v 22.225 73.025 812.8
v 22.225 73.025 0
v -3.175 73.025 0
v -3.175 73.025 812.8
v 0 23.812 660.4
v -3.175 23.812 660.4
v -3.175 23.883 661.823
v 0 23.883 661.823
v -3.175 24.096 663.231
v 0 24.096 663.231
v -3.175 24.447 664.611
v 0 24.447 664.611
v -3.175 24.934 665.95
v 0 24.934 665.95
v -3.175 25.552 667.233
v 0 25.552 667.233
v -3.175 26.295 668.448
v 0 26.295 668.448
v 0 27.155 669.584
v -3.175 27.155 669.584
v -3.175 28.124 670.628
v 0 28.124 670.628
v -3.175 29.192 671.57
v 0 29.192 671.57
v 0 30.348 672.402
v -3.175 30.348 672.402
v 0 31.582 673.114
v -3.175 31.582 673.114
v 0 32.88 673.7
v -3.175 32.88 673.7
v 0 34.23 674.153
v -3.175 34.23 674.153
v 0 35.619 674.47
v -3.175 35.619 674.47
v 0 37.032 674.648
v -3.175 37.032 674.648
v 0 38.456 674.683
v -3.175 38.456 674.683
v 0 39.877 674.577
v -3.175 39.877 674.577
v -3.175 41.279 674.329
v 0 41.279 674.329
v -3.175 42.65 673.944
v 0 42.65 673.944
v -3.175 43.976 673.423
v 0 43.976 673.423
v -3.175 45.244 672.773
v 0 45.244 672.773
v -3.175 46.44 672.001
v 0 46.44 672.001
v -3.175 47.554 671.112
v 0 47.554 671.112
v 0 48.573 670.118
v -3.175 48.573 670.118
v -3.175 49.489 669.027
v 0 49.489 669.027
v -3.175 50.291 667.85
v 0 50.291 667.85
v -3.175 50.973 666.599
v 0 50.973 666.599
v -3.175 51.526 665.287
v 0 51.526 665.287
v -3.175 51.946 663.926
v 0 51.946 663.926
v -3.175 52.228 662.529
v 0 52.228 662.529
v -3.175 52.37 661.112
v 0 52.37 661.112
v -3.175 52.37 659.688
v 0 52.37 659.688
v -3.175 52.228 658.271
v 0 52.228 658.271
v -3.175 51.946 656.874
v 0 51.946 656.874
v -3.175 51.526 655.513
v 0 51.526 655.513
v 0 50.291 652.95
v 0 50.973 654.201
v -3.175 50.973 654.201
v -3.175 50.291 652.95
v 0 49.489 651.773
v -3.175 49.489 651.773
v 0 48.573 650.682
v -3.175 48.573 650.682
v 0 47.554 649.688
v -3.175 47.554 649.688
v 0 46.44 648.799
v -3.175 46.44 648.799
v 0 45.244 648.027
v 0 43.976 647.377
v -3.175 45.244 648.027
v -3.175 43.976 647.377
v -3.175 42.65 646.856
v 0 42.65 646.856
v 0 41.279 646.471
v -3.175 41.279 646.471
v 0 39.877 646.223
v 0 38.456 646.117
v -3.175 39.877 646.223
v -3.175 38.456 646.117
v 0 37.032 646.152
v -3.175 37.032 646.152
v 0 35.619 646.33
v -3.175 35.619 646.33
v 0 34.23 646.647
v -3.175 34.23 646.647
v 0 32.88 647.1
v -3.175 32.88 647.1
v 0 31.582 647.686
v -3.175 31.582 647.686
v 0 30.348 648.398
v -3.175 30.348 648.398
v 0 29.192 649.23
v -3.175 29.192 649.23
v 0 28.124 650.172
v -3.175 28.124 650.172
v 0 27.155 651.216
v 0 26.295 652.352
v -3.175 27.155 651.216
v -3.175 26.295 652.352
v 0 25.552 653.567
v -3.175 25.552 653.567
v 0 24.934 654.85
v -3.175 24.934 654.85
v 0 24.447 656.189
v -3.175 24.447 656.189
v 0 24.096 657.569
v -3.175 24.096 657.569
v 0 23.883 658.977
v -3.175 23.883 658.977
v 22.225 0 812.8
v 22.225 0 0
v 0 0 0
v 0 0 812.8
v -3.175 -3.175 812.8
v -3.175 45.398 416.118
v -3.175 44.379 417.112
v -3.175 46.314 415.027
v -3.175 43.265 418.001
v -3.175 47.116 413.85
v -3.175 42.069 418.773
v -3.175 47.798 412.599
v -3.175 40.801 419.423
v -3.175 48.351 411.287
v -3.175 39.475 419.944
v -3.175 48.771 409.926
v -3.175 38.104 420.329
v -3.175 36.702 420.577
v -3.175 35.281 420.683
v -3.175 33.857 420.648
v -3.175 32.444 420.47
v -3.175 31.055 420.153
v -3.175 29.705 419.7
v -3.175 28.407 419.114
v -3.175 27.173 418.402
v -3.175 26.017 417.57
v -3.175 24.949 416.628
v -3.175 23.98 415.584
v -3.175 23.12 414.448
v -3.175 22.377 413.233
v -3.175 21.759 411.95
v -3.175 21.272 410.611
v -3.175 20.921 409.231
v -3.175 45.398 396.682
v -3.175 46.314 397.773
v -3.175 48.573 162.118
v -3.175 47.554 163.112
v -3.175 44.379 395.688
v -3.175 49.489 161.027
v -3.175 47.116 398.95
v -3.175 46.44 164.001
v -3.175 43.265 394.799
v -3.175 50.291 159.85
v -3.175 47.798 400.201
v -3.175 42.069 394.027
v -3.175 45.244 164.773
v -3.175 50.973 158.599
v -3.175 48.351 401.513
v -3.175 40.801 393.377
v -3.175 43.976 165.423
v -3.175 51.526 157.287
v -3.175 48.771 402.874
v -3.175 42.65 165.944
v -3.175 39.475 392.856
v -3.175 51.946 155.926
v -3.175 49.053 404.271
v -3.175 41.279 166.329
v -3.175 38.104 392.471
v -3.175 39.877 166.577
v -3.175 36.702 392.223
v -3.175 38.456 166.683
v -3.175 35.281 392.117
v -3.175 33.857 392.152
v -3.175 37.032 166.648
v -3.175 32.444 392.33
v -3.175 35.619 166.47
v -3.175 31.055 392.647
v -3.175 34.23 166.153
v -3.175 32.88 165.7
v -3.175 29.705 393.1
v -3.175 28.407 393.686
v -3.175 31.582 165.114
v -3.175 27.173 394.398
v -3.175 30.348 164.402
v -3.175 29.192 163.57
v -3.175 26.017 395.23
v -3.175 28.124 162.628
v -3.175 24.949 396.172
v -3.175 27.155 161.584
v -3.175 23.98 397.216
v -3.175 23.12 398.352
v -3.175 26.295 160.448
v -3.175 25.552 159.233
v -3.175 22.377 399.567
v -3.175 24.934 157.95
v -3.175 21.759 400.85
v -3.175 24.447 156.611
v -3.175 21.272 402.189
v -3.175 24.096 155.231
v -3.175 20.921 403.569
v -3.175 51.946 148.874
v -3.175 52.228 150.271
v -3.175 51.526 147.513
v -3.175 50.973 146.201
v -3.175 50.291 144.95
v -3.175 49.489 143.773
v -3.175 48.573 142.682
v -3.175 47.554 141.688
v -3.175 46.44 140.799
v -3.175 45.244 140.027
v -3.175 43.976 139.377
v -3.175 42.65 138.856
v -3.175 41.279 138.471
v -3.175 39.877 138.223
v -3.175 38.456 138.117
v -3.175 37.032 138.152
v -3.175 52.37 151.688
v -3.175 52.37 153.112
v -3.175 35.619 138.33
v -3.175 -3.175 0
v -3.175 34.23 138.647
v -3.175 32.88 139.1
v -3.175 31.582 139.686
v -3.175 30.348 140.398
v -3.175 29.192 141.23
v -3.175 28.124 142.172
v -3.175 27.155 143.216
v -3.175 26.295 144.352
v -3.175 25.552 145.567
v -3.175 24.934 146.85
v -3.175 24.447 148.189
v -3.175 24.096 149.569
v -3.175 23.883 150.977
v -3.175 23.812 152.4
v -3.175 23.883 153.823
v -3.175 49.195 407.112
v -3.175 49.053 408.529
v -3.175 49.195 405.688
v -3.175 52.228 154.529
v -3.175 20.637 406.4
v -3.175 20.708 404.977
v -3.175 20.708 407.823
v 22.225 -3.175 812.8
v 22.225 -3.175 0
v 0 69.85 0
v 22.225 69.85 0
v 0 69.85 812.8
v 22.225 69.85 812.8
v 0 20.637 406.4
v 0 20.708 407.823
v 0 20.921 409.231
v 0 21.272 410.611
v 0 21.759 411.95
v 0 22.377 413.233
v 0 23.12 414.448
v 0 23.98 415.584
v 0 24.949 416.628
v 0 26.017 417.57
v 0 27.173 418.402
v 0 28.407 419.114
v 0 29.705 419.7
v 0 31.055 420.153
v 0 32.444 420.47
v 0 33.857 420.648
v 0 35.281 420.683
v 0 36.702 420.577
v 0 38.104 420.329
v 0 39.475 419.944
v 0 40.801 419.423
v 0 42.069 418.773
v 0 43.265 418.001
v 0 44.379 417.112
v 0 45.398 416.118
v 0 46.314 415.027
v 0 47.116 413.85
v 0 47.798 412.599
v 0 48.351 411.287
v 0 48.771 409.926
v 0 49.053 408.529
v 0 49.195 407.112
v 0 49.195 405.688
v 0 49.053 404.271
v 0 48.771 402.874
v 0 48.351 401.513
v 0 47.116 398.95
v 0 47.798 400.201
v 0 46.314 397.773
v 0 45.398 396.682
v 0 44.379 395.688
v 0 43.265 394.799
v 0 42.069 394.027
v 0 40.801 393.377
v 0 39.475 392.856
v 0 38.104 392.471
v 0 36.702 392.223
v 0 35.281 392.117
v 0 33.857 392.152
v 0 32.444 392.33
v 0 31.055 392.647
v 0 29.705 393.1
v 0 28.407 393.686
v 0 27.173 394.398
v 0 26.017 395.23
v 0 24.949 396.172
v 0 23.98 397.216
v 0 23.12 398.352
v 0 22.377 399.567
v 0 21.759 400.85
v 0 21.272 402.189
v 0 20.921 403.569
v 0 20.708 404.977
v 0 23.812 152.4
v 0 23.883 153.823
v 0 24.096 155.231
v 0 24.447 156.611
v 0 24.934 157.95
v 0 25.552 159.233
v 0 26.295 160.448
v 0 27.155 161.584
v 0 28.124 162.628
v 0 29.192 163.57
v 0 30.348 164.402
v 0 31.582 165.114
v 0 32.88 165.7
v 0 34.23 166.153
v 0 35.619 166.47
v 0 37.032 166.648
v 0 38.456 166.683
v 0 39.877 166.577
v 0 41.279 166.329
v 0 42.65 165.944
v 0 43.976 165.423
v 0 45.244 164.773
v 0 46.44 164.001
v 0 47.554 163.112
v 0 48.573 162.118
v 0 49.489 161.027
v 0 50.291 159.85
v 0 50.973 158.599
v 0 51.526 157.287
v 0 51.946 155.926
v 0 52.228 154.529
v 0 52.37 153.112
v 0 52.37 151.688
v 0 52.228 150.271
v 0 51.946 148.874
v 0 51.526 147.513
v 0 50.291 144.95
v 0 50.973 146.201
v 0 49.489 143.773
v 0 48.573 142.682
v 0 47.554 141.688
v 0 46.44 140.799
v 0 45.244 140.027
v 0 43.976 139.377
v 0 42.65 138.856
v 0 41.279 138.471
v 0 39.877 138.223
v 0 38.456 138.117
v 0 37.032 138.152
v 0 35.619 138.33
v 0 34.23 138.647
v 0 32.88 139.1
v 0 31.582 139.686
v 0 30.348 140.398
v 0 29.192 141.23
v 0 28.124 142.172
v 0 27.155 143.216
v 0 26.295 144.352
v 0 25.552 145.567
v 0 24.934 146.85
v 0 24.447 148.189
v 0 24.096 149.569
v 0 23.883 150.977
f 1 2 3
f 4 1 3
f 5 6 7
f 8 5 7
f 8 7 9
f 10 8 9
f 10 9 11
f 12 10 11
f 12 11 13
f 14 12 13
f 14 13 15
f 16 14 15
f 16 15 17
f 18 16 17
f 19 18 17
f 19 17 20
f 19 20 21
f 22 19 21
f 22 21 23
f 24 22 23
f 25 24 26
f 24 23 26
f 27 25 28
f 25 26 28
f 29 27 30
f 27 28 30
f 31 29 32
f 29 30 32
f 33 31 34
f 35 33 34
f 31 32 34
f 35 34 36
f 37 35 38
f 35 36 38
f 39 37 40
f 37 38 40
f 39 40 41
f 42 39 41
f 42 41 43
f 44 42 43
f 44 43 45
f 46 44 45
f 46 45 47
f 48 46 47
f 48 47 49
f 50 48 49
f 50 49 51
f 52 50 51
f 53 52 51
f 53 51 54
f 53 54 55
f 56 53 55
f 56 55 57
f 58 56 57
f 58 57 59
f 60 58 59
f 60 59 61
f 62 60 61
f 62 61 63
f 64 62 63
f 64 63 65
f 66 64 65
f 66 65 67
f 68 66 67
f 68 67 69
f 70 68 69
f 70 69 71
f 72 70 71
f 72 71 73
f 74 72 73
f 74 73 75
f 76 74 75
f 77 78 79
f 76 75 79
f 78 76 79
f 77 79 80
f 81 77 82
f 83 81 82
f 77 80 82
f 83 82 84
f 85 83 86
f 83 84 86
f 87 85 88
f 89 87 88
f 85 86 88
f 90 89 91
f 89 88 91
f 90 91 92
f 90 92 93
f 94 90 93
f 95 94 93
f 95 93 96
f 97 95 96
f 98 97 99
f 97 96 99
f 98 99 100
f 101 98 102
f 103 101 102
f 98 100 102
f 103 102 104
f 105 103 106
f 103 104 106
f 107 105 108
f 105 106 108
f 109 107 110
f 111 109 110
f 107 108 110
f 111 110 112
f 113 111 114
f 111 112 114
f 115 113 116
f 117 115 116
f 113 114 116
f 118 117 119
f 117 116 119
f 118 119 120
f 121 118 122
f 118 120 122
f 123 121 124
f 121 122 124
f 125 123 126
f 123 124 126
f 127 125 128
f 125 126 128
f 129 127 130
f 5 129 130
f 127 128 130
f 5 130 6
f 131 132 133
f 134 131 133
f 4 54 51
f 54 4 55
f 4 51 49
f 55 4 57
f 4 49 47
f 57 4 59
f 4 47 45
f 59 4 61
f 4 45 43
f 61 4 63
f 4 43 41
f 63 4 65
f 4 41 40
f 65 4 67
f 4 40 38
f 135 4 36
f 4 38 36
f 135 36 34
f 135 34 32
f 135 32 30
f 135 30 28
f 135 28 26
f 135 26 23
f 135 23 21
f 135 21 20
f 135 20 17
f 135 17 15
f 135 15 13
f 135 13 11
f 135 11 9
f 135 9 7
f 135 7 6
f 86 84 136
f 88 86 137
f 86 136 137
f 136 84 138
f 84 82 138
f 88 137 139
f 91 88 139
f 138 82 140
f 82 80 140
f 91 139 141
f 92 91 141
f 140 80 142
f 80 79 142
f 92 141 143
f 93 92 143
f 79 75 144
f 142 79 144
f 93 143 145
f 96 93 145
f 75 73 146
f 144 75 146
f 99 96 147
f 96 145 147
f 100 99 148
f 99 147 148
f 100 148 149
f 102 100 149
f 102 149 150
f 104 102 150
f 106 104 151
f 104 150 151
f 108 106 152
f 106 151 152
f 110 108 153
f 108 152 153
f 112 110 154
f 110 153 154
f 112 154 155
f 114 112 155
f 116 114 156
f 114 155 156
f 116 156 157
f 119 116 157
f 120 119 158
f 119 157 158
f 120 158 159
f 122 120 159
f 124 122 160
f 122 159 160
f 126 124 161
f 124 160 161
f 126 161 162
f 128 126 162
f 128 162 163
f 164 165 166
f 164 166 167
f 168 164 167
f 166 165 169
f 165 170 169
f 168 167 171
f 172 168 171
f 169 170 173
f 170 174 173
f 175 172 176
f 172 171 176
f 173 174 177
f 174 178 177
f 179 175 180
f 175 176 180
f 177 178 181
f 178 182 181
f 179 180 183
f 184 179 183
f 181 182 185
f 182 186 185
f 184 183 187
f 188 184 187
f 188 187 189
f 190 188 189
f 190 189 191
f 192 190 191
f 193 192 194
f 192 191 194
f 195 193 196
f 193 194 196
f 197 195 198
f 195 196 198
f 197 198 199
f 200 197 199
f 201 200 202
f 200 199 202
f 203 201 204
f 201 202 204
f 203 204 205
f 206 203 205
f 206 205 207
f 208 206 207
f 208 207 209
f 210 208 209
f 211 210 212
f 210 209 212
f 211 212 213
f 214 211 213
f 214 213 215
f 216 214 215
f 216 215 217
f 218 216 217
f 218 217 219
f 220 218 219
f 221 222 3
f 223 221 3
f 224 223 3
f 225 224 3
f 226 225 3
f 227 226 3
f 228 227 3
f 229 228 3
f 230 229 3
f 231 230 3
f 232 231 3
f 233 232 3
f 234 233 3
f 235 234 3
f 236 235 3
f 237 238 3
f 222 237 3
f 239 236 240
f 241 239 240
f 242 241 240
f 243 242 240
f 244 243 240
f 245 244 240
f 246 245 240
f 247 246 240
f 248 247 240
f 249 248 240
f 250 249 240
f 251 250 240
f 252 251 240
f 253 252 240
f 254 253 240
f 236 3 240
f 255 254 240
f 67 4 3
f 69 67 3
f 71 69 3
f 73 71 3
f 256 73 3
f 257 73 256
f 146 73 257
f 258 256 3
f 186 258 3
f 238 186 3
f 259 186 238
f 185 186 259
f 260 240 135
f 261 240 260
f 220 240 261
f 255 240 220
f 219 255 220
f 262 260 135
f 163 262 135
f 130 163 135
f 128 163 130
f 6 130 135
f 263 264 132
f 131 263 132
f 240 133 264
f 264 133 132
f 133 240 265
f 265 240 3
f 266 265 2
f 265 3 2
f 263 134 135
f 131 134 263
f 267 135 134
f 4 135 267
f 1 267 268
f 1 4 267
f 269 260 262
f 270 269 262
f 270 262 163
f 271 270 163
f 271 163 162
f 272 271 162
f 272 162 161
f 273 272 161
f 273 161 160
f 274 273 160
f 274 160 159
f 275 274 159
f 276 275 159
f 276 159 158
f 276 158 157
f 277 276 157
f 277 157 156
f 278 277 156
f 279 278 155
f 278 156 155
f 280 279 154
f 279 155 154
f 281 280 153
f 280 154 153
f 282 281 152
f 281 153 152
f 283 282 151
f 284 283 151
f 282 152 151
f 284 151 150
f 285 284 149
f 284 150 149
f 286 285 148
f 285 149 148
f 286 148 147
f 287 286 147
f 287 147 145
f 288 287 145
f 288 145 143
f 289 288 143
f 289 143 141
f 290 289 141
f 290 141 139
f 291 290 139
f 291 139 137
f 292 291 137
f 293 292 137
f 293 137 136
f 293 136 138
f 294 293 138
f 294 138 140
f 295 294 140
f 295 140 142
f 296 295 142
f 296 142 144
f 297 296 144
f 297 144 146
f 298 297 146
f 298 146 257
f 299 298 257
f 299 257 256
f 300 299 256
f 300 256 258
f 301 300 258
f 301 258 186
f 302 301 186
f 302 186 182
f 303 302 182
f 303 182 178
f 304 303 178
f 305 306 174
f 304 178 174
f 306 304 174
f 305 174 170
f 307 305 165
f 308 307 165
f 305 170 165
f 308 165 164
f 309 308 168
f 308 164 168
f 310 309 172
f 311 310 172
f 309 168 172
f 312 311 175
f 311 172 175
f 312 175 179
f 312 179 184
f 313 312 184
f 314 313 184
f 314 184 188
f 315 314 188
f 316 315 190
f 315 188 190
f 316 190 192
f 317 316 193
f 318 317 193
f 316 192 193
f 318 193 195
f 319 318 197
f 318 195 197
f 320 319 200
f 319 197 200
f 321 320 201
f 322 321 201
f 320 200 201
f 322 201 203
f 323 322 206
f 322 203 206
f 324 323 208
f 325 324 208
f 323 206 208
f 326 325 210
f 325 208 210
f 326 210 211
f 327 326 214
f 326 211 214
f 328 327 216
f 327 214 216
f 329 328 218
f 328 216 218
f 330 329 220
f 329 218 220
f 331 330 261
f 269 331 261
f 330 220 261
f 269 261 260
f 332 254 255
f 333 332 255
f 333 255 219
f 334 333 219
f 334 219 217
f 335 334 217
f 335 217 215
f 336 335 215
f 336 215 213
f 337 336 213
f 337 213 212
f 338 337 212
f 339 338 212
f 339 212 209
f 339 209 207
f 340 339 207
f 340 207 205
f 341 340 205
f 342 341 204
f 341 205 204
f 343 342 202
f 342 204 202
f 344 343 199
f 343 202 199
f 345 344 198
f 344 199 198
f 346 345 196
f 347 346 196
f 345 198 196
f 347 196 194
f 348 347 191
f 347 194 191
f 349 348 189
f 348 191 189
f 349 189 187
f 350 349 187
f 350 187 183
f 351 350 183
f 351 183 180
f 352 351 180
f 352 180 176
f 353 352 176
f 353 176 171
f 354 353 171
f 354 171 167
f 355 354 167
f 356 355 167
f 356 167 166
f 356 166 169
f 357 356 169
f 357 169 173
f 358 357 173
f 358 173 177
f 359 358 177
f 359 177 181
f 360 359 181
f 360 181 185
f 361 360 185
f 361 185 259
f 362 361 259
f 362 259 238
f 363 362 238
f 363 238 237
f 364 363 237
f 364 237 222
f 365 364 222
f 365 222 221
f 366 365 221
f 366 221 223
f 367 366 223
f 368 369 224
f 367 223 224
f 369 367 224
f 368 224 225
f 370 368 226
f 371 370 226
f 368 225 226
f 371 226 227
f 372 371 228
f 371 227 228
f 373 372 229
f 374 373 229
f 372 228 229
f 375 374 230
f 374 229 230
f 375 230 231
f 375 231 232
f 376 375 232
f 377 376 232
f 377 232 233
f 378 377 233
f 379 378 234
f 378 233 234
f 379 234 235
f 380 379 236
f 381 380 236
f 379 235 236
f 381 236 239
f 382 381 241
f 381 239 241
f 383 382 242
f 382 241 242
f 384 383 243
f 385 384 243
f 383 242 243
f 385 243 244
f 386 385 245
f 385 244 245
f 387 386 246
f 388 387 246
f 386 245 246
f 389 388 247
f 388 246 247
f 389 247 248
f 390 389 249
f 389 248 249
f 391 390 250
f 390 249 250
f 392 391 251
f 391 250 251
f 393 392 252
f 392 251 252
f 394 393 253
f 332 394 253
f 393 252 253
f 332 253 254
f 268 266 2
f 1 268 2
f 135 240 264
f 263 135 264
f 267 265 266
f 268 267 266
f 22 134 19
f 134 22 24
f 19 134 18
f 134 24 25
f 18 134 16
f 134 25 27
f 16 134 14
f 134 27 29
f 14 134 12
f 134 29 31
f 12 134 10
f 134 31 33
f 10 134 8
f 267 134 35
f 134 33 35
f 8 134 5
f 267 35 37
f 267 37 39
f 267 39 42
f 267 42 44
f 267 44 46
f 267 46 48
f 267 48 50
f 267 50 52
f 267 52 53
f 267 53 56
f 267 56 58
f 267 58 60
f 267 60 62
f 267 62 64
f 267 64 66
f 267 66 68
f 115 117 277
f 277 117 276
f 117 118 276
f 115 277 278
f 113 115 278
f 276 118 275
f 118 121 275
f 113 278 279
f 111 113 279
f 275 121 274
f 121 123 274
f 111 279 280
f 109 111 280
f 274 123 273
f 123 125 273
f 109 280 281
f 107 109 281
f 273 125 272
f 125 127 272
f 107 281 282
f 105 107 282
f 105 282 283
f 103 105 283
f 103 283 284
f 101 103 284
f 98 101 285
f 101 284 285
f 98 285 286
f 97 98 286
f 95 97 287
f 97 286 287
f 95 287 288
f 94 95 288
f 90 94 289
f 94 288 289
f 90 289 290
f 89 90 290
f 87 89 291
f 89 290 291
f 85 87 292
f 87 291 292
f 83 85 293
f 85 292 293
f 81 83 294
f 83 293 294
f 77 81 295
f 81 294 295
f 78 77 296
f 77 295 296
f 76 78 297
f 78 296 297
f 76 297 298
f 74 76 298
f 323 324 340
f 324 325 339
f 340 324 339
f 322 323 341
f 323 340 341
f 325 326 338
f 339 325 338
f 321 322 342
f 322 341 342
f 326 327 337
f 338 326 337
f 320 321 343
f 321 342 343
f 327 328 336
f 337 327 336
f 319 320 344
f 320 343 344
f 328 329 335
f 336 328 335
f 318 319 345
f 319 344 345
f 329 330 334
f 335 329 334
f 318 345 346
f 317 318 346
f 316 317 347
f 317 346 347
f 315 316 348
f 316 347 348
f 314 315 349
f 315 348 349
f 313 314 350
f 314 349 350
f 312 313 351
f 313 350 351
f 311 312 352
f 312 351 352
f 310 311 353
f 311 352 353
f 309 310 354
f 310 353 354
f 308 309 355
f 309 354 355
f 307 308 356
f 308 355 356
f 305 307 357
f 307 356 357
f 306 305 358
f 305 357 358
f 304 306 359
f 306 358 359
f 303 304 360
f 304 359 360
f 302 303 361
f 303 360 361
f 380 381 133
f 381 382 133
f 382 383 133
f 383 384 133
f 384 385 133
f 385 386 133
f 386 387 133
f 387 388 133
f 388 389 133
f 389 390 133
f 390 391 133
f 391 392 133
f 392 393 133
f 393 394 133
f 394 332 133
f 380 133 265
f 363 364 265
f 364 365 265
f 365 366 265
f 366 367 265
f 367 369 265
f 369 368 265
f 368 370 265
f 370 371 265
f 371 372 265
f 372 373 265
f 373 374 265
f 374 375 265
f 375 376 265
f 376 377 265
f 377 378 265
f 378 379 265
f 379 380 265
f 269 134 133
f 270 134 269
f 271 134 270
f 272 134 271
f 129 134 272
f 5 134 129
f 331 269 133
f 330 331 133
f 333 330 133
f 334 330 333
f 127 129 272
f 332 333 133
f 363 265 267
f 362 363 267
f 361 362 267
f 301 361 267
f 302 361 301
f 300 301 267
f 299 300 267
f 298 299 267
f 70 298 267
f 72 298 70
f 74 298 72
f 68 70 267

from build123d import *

# Parameters (mm, degrees)
BOSS_EXTRUDE1_DEPTH = 812.8
SKETCH2_R           = 14.2875
CUT_EXTRUDE1_DEPTH  = 817.469013879


with BuildPart() as part:
    # Sketch1 → Boss-Extrude1 (new body)
    with BuildSketch(Plane.XY):
        Polygon((0, 0), (0, 69.85), (22.225, 69.85), (22.225, 73.025), (-3.175, 73.025), (-3.175, -3.175), (22.225, -3.175), (22.225, 0), align=None)
    extrude(amount=BOSS_EXTRUDE1_DEPTH)

    # Sketch2 → Cut-Extrude1 (cut, through all)
    with BuildSketch(Plane.ZY.offset(3.175)):
        with Locations((406.4, 34.925)):
            Circle(SKETCH2_R)
        with Locations((152.4, 38.1)):
            Circle(SKETCH2_R)
        with Locations((660.4, 38.1)):
            Circle(SKETCH2_R)
    extrude(amount=-CUT_EXTRUDE1_DEPTH, mode=Mode.SUBTRACT)


solid = part.part
